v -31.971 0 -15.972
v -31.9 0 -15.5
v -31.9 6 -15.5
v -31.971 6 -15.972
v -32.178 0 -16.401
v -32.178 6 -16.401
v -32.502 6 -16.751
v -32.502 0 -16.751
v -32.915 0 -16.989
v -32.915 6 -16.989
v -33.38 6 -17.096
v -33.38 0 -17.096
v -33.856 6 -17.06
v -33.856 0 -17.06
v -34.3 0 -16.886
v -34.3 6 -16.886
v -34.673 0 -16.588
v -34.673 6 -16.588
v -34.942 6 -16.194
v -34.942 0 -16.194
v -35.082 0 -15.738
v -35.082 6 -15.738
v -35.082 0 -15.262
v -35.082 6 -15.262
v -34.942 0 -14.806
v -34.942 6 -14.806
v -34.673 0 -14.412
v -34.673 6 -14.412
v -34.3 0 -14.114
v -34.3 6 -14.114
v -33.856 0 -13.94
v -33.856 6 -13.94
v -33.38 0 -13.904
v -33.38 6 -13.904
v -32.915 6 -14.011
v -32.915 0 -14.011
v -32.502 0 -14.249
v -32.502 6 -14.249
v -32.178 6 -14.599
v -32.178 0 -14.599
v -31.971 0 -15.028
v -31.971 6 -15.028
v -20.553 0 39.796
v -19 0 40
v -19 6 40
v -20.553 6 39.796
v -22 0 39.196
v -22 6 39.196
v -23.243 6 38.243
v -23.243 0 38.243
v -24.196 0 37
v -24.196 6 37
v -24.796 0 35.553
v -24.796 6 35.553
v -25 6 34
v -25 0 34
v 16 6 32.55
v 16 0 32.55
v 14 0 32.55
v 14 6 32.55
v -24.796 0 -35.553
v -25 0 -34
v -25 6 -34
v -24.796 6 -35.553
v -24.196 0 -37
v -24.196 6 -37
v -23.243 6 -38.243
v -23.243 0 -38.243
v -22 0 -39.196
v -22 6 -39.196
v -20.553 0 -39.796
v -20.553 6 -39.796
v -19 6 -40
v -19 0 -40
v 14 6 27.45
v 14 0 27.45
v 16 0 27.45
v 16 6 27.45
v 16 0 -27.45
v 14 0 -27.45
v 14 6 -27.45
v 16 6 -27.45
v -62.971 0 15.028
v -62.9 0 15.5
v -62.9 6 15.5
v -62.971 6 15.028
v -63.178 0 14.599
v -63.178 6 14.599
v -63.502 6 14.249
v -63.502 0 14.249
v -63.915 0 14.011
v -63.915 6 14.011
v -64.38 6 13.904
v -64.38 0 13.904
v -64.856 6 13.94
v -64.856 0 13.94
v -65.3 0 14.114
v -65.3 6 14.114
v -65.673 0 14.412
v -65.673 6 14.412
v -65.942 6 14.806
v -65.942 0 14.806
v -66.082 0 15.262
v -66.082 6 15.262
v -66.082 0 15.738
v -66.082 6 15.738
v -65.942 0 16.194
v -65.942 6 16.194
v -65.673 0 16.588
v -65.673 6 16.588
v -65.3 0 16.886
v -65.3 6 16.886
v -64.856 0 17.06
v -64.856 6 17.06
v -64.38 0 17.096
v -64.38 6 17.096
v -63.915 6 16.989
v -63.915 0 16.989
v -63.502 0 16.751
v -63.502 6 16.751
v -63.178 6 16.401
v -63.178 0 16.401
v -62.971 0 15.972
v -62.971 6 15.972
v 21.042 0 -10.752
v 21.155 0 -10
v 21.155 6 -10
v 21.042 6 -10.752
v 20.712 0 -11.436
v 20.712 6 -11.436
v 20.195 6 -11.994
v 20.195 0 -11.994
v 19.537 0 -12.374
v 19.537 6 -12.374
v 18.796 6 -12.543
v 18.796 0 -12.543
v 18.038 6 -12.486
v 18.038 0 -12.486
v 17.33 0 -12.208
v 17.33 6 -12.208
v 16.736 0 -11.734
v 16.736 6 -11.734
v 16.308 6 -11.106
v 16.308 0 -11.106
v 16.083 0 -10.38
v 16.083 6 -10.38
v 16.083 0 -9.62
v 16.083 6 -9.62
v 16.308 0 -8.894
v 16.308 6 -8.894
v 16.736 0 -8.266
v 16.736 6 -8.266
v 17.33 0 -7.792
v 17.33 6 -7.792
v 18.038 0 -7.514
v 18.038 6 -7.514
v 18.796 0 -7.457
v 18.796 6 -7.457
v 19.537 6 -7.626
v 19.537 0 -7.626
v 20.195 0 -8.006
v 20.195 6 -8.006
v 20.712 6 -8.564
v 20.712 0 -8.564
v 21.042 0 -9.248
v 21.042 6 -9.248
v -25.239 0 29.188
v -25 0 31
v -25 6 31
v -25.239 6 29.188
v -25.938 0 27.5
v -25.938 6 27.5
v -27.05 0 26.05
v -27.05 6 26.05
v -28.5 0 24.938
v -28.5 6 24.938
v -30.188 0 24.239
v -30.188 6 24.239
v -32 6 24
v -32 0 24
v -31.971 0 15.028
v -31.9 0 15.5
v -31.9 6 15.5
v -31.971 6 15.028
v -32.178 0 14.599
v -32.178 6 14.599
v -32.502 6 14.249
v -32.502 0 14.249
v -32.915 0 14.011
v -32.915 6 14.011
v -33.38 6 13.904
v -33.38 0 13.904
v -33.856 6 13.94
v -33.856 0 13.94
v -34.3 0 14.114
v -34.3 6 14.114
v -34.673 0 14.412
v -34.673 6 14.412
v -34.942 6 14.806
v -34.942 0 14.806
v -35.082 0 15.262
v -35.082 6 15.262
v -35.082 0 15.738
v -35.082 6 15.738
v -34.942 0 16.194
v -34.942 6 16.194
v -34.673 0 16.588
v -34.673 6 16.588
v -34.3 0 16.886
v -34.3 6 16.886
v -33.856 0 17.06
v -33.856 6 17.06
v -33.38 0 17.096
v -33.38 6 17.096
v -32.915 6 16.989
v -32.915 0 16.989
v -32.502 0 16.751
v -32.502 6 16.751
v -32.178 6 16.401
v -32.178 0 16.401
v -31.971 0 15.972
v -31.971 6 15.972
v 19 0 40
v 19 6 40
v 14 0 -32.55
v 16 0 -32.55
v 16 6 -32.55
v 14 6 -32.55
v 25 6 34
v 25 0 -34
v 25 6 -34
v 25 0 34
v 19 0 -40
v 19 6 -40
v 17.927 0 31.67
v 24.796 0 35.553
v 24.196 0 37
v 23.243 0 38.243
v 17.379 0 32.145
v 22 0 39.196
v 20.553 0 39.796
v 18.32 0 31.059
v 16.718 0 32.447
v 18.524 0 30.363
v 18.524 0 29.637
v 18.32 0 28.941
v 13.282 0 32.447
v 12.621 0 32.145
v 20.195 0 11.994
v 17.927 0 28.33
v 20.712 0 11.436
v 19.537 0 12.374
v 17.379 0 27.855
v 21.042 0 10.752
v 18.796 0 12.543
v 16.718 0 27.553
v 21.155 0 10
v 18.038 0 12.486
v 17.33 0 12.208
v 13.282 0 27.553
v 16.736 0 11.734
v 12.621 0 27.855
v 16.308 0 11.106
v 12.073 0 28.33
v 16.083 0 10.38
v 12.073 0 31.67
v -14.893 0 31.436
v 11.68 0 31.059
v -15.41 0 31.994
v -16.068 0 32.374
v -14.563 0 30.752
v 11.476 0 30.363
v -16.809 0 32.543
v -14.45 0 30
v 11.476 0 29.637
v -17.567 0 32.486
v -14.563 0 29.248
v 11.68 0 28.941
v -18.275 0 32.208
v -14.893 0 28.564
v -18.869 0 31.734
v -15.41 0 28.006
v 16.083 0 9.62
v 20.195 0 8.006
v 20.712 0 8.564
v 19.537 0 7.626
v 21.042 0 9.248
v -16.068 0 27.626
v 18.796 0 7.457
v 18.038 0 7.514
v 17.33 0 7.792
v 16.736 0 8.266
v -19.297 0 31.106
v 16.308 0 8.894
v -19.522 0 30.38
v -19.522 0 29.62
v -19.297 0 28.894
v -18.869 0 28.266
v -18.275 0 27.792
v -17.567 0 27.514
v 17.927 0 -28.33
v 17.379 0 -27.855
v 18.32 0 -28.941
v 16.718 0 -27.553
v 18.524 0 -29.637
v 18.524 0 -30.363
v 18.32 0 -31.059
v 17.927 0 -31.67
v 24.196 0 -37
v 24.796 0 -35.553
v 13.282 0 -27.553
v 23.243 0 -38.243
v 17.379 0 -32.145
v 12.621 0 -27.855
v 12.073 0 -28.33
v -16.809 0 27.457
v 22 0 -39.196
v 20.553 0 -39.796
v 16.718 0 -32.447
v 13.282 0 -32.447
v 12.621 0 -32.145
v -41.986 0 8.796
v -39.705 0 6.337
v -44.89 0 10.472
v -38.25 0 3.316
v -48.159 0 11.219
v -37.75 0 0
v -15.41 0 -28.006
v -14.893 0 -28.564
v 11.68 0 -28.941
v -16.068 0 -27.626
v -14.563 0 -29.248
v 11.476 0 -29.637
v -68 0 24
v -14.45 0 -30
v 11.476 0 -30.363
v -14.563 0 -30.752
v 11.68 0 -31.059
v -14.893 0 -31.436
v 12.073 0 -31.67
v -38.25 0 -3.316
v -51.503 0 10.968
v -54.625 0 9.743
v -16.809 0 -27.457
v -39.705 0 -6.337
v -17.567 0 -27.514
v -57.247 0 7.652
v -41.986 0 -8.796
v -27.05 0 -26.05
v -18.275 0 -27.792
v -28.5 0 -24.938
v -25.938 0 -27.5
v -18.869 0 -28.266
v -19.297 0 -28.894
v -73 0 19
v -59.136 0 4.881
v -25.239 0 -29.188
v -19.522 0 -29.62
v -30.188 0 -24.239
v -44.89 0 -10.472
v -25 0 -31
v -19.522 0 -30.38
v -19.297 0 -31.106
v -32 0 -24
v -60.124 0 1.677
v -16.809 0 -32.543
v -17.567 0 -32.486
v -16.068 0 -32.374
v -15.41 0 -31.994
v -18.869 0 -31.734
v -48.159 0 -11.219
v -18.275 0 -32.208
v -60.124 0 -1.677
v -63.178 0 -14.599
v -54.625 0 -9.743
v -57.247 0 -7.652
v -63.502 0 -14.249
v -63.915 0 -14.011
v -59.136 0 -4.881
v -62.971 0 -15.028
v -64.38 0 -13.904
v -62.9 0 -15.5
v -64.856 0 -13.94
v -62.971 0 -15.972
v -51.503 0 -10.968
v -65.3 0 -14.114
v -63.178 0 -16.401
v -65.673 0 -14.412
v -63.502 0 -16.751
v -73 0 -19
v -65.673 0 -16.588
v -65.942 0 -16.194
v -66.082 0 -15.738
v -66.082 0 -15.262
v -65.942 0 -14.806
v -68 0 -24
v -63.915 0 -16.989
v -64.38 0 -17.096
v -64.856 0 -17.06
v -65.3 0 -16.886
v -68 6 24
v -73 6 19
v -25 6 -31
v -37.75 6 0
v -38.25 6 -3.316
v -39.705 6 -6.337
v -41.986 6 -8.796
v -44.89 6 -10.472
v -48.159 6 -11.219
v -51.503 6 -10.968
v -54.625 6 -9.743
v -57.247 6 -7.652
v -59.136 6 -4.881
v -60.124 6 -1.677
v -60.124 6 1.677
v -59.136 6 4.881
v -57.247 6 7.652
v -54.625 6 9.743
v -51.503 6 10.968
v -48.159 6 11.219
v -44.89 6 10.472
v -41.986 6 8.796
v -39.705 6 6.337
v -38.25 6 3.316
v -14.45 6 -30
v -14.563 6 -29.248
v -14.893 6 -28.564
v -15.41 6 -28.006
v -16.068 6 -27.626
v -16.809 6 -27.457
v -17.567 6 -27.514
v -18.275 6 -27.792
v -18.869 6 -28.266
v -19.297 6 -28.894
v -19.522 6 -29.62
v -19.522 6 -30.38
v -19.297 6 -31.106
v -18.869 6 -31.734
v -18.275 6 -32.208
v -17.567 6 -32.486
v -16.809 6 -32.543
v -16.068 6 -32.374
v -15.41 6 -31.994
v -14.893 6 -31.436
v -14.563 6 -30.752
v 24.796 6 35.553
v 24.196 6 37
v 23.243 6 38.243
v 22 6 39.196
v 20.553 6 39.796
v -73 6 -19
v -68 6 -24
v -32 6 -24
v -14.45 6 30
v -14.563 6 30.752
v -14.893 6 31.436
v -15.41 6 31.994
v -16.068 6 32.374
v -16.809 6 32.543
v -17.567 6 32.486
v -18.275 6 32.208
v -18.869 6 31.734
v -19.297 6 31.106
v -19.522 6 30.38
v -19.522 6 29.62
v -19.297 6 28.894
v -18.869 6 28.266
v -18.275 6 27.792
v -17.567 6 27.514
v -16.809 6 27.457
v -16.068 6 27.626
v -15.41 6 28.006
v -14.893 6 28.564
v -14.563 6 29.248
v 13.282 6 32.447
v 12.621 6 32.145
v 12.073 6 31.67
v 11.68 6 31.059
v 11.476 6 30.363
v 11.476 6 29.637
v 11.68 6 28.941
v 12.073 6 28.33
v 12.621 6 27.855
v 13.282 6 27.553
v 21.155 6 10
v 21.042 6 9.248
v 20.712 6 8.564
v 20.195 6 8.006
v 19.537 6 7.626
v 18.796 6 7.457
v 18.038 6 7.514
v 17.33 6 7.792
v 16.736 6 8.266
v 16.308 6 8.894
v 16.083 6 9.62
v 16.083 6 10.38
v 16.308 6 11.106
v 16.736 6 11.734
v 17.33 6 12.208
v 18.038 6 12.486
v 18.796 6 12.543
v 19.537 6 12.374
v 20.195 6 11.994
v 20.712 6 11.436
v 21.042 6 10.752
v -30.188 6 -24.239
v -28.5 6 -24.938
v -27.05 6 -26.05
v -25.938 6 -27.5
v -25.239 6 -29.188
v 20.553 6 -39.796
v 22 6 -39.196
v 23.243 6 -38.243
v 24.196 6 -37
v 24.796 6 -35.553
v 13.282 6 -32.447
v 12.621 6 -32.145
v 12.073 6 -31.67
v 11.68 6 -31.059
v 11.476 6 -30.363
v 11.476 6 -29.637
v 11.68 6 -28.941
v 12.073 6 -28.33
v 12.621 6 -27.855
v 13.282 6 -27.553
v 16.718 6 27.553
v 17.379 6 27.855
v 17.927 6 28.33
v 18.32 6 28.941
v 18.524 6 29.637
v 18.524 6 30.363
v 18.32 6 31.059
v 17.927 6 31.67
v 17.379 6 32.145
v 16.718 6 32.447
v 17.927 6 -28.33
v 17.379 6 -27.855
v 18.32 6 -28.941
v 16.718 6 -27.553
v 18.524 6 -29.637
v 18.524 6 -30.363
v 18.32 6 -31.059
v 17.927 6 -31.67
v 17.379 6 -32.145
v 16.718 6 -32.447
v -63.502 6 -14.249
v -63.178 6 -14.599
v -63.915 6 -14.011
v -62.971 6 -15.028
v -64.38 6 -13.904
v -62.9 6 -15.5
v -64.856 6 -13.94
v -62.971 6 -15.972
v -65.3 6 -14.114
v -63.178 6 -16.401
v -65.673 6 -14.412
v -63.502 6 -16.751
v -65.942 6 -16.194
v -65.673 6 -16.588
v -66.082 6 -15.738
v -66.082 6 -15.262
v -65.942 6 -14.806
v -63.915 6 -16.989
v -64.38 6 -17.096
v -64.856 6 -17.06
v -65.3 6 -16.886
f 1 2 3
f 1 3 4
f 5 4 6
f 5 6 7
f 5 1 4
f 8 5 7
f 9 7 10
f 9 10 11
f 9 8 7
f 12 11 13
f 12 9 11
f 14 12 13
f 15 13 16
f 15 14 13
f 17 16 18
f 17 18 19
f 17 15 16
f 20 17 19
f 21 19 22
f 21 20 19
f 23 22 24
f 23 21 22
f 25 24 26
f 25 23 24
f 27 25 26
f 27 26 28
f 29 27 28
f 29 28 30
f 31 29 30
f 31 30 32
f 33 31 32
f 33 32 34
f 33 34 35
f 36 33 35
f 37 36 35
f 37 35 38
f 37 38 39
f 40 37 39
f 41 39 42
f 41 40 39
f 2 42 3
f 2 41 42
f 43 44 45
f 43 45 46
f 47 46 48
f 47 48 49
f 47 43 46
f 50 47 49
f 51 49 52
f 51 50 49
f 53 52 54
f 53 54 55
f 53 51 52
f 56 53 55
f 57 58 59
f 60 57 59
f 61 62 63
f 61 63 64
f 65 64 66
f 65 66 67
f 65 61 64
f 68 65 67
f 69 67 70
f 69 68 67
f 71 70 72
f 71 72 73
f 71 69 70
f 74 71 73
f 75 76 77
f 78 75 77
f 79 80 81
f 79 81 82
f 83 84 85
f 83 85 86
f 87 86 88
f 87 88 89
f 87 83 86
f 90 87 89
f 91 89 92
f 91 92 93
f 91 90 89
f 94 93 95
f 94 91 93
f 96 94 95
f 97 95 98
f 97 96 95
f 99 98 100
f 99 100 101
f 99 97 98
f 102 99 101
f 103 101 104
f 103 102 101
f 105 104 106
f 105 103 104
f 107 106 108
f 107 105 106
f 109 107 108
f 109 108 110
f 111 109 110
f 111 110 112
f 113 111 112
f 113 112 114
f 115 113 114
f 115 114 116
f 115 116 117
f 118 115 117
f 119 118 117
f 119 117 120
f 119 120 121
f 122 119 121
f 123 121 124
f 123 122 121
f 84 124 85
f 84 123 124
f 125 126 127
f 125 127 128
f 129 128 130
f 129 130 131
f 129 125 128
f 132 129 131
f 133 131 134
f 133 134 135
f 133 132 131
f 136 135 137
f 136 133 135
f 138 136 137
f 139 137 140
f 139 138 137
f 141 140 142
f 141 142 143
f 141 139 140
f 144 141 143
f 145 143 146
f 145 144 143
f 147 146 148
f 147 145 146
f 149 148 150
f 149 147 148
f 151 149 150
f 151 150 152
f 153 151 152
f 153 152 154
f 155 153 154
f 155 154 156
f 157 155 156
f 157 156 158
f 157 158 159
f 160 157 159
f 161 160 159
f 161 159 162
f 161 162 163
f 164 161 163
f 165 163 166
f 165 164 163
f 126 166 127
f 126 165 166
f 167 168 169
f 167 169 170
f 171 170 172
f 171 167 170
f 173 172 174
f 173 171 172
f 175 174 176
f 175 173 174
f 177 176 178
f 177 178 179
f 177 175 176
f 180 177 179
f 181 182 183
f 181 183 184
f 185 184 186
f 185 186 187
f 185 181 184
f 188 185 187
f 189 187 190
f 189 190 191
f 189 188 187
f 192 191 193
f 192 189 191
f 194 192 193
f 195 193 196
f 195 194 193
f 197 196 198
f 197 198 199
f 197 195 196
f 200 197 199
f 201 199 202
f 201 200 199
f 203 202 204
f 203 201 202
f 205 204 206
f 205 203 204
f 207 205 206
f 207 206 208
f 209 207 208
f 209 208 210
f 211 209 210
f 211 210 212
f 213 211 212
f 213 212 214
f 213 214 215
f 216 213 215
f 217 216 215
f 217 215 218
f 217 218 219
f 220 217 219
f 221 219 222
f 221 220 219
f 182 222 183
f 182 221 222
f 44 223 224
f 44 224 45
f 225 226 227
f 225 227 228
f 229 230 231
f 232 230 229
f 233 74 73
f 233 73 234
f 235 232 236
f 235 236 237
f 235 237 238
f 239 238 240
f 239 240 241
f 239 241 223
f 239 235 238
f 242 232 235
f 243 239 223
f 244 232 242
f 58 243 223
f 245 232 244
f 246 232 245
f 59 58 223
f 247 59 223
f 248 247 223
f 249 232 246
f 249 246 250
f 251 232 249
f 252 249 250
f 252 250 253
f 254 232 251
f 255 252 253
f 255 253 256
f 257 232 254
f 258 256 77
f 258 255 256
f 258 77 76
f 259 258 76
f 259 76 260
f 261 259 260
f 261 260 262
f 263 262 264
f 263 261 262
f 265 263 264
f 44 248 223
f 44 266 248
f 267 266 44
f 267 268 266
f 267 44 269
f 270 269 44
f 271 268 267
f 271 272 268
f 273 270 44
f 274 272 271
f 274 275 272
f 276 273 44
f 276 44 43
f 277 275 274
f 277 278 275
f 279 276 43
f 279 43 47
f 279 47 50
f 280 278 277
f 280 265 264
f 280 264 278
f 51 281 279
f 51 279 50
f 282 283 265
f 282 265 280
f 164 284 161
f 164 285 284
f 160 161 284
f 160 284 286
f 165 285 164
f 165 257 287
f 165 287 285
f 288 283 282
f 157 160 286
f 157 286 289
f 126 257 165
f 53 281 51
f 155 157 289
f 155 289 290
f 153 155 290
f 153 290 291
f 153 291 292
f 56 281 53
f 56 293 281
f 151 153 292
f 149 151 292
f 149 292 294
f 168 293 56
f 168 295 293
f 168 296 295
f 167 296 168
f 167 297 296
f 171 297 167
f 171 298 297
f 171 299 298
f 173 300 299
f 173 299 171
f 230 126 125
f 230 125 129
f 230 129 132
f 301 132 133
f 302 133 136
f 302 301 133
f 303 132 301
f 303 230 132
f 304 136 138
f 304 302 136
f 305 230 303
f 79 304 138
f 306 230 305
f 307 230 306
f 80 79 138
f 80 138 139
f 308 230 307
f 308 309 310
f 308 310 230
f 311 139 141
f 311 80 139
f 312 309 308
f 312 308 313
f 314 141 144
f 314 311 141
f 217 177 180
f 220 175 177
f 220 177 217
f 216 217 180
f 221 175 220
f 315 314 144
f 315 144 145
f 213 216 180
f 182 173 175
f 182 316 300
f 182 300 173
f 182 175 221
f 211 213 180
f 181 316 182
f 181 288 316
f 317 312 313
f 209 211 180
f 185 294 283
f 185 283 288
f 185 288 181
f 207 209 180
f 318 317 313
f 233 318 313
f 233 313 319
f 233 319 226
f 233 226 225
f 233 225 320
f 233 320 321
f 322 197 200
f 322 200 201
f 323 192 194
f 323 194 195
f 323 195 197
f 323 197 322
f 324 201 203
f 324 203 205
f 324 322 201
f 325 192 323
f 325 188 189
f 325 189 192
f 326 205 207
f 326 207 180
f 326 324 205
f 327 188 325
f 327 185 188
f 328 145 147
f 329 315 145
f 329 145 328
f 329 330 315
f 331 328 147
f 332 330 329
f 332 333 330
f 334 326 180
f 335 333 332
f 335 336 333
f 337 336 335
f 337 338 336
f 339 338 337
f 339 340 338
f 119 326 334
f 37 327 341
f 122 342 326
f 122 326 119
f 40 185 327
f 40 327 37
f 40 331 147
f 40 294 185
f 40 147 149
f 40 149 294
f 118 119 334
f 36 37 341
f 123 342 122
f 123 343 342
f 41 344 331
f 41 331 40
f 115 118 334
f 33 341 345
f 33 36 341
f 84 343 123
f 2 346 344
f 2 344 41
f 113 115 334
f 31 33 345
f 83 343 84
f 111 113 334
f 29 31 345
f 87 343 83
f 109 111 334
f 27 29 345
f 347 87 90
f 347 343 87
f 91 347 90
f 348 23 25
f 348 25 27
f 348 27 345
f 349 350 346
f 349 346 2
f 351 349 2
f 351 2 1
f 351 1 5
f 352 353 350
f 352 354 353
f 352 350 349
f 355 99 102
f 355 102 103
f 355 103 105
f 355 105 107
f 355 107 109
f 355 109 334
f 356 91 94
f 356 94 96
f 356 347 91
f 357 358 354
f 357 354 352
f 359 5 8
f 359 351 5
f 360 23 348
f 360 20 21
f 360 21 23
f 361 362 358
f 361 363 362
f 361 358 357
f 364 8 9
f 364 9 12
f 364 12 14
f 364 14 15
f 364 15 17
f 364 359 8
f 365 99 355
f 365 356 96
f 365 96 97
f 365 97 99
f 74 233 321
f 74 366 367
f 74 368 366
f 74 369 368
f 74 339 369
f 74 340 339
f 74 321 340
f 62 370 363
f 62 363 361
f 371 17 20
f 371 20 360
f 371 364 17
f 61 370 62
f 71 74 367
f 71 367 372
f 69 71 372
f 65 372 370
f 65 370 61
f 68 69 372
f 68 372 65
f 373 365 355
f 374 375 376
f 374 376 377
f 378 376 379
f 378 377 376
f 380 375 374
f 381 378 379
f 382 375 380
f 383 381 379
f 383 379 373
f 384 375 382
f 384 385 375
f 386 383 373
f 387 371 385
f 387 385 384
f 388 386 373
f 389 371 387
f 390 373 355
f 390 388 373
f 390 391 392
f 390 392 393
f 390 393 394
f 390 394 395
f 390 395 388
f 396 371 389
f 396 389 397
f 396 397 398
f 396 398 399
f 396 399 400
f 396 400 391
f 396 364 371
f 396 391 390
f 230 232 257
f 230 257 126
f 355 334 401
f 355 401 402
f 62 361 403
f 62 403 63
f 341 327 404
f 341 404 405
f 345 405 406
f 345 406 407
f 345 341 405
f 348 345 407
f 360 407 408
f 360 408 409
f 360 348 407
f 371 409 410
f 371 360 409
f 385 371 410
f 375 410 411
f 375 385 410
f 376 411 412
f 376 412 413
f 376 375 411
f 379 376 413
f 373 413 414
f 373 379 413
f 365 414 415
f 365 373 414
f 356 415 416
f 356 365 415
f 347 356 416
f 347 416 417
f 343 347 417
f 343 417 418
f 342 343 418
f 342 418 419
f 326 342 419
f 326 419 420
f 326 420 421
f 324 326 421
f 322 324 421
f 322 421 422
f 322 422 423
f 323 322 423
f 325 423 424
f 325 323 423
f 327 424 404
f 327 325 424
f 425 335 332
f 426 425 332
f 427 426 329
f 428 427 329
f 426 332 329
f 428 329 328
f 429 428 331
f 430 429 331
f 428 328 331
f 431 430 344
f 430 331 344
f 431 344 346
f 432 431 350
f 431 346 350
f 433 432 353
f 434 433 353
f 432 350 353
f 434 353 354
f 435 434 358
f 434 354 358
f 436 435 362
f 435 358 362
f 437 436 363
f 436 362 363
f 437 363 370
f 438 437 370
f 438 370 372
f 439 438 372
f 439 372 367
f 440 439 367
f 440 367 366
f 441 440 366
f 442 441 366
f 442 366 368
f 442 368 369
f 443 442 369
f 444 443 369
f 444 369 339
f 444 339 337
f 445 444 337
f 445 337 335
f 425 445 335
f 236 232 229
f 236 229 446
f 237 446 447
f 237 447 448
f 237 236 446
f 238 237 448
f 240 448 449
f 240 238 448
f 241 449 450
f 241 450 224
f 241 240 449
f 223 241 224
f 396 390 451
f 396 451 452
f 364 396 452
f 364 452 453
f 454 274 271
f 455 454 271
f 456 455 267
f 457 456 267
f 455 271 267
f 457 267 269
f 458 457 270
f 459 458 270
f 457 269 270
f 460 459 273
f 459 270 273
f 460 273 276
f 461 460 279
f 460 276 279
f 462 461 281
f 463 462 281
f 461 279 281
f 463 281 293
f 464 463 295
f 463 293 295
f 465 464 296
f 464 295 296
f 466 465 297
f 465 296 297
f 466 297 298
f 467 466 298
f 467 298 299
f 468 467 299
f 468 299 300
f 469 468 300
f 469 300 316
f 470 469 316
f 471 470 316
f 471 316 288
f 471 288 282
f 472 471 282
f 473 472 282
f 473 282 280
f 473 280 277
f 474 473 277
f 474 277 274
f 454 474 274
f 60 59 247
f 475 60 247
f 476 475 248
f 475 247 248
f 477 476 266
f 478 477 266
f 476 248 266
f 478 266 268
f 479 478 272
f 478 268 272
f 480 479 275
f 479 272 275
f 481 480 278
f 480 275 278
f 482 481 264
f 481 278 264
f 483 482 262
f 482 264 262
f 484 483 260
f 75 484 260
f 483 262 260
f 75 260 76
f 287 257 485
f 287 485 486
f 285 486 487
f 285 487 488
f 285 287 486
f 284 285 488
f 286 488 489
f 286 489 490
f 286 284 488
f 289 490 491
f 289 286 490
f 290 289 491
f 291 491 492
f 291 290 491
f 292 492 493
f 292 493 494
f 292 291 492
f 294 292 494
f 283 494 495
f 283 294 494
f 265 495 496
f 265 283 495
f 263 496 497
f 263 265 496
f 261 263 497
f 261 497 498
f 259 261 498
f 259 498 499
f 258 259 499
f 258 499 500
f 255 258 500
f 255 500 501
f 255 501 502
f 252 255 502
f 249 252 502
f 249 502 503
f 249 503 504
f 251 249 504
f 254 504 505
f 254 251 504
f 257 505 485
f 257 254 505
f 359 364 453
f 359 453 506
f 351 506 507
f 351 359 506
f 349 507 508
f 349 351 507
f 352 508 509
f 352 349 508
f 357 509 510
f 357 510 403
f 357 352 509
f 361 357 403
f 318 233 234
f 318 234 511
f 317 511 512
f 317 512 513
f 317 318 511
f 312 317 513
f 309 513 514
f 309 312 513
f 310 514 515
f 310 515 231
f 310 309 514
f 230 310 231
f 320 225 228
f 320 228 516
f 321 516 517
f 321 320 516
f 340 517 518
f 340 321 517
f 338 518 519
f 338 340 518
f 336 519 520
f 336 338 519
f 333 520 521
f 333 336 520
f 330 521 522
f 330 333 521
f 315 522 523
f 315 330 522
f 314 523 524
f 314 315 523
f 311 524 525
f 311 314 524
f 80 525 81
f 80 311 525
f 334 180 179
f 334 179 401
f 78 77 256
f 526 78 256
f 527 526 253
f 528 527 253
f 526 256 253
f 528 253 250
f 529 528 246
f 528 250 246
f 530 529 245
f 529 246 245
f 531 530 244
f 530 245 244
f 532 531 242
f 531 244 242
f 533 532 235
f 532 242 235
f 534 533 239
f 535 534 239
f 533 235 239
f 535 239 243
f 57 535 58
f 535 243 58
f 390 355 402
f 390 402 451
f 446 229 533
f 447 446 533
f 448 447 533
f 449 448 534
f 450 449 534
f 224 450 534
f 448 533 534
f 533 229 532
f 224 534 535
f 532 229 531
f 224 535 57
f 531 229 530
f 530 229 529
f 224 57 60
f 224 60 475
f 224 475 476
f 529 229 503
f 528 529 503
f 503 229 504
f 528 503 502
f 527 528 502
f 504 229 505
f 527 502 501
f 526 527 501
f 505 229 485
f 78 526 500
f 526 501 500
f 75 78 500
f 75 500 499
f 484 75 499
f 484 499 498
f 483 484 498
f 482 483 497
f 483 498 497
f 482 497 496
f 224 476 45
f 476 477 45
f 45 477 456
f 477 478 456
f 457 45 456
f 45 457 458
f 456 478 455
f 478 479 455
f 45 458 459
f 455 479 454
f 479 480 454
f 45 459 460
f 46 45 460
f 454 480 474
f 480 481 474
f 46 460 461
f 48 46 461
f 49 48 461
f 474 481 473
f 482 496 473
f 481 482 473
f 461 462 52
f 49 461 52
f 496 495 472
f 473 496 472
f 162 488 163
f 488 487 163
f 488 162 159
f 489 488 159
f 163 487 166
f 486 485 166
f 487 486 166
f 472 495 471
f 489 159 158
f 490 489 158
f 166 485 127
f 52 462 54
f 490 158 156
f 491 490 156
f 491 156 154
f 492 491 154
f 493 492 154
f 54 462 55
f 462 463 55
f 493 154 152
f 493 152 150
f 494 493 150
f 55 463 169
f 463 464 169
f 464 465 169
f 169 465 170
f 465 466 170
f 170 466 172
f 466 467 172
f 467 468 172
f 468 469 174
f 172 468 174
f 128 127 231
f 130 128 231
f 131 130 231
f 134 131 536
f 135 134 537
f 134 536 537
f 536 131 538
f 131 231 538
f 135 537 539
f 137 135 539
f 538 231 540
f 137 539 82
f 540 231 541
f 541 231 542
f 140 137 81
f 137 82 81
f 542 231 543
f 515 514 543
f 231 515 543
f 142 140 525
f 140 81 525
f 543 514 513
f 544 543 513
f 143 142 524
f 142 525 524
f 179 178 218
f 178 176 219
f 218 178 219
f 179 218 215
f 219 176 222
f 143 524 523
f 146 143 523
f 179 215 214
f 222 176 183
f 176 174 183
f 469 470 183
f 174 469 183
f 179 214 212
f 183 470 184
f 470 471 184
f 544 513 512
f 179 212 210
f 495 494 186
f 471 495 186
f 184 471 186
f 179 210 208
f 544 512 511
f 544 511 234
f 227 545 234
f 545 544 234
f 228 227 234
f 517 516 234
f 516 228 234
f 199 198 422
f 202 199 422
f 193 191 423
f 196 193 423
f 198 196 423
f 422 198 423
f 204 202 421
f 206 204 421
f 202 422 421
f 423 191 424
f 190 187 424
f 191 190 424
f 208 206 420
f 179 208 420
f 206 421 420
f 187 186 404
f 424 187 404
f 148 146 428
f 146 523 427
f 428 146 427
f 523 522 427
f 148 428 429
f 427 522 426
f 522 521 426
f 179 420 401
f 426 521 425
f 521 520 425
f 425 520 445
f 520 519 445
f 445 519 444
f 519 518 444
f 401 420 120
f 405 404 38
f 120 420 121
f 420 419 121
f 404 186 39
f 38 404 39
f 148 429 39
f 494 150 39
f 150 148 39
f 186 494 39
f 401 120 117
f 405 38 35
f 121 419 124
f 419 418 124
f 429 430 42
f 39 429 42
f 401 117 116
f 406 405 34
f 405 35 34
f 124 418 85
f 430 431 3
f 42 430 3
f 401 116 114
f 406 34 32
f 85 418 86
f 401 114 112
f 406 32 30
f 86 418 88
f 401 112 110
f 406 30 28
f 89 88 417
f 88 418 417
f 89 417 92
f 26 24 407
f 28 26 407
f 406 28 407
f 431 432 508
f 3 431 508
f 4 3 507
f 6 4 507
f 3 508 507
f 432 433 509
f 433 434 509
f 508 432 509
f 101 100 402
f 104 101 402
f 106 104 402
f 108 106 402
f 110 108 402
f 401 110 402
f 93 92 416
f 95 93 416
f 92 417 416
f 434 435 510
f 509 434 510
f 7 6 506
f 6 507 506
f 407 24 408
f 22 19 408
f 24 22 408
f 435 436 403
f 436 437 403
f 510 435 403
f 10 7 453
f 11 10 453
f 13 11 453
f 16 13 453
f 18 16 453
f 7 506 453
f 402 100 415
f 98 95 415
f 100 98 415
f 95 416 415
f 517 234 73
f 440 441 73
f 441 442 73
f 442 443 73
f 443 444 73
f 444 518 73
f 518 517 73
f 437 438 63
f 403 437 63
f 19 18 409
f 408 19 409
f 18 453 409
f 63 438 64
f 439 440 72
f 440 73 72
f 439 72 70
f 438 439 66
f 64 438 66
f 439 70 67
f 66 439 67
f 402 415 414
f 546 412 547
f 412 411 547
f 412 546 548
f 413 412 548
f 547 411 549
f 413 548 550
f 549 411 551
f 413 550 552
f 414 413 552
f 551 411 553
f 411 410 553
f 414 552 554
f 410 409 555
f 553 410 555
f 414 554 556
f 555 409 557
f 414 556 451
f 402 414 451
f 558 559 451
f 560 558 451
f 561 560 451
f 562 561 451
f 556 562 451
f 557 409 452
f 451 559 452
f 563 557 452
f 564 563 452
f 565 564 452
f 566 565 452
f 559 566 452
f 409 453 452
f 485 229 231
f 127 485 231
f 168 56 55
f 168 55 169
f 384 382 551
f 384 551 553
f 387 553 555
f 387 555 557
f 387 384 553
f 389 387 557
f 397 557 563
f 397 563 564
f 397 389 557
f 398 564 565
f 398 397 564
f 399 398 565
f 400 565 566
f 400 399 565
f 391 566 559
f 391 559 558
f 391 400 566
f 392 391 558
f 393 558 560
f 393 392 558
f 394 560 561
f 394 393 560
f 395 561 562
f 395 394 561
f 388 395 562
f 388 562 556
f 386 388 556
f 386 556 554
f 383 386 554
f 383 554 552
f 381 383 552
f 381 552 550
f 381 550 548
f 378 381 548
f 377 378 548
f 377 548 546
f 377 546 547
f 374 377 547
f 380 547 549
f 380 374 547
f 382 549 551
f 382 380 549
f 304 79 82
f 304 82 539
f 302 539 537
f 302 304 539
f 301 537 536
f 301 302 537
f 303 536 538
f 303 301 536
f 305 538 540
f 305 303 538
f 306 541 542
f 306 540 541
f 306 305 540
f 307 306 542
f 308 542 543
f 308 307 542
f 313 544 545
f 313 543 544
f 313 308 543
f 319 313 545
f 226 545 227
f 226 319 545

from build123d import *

# Parameters (mm, degrees)
SKETCH_1_R          = 11.25
SKETCH_1_R_2        = 1.6
SKETCH_1_R_3        = 2.550000002
EXTRUDE_1_DEPTH     = 6
SKETCH_2_R          = 2.55
CUT_EXTRUDE_1_DEPTH = 7


with BuildPart() as part:
    # Эскиз1 → Бобышка-Вытянуть1 (new body)
    with BuildSketch(Plane(origin=(0, 0, 0), x_dir=(1, 0, 0), z_dir=(0, 1, 0))):
        with BuildLine():
            Line((-32, -24), (-68, -24))
            Line((-68, -24), (-73, -19))
            Line((-73, -19), (-73, 19))
            Line((-73, 19), (-68, 24))
            Line((-68, 24), (-32, 24))
            ThreePointArc((-32, 24), (-27.050252532, 26.050252532), (-25, 31))
            Line((-25, 31), (-25, 34))
            ThreePointArc((-25, 34), (-23.242640687, 38.242640687), (-19, 40))
            Line((-19, 40), (19, 40))
            ThreePointArc((19, 40), (23.242640687, 38.242640687), (25, 34))
            Line((25, 34), (25, -34))
            ThreePointArc((25, -34), (23.242640687, -38.242640687), (19, -40))
            Line((19, -40), (-19, -40))
            ThreePointArc((-19, -40), (-23.242640687, -38.242640687), (-25, -34))
            Line((-25, -34), (-25, -31))
            ThreePointArc((-25, -31), (-27.050252532, -26.050252532), (-32, -24))
        make_face()
        with Locations((-49, 0)):
            Circle(SKETCH_1_R, mode=Mode.SUBTRACT)
        with Locations((-64.5, 15.5)):
            Circle(SKETCH_1_R_2, mode=Mode.SUBTRACT)
        with Locations((-64.5, -15.5)):
            Circle(SKETCH_1_R_2, mode=Mode.SUBTRACT)
        with Locations((-33.5, 15.5)):
            Circle(SKETCH_1_R_2, mode=Mode.SUBTRACT)
        with Locations((-33.5, -15.5)):
            Circle(SKETCH_1_R_2, mode=Mode.SUBTRACT)
        with Locations((18.604999997, -10)):
            Circle(SKETCH_1_R_3, mode=Mode.SUBTRACT)
        with Locations((18.604999997, 10)):
            Circle(SKETCH_1_R_3, mode=Mode.SUBTRACT)
    extrude(amount=EXTRUDE_1_DEPTH)

    # Эскиз2 → Вырез-Вытянуть1 (cut, through all)
    with BuildSketch(Plane.XZ):
        with Locations((-17, -30)):
            Circle(SKETCH_2_R)
        with Locations((-17, 30)):
            Circle(SKETCH_2_R)
        with BuildLine():
            Line((16, -32.55), (14, -32.55))
            ThreePointArc((14, -32.55), (11.45, -30), (14, -27.45))
            Line((14, -27.45), (16, -27.45))
            ThreePointArc((16, -27.45), (18.55, -30), (16, -32.55))
        make_face()
        with BuildLine():
            Line((16, 32.55), (14, 32.55))
            ThreePointArc((14, 32.55), (11.45, 30), (14, 27.45))
            Line((14, 27.45), (16, 27.45))
            ThreePointArc((16, 27.45), (18.55, 30), (16, 32.55))
        make_face()
    extrude(amount=-CUT_EXTRUDE_1_DEPTH, mode=Mode.SUBTRACT)


solid = part.part
